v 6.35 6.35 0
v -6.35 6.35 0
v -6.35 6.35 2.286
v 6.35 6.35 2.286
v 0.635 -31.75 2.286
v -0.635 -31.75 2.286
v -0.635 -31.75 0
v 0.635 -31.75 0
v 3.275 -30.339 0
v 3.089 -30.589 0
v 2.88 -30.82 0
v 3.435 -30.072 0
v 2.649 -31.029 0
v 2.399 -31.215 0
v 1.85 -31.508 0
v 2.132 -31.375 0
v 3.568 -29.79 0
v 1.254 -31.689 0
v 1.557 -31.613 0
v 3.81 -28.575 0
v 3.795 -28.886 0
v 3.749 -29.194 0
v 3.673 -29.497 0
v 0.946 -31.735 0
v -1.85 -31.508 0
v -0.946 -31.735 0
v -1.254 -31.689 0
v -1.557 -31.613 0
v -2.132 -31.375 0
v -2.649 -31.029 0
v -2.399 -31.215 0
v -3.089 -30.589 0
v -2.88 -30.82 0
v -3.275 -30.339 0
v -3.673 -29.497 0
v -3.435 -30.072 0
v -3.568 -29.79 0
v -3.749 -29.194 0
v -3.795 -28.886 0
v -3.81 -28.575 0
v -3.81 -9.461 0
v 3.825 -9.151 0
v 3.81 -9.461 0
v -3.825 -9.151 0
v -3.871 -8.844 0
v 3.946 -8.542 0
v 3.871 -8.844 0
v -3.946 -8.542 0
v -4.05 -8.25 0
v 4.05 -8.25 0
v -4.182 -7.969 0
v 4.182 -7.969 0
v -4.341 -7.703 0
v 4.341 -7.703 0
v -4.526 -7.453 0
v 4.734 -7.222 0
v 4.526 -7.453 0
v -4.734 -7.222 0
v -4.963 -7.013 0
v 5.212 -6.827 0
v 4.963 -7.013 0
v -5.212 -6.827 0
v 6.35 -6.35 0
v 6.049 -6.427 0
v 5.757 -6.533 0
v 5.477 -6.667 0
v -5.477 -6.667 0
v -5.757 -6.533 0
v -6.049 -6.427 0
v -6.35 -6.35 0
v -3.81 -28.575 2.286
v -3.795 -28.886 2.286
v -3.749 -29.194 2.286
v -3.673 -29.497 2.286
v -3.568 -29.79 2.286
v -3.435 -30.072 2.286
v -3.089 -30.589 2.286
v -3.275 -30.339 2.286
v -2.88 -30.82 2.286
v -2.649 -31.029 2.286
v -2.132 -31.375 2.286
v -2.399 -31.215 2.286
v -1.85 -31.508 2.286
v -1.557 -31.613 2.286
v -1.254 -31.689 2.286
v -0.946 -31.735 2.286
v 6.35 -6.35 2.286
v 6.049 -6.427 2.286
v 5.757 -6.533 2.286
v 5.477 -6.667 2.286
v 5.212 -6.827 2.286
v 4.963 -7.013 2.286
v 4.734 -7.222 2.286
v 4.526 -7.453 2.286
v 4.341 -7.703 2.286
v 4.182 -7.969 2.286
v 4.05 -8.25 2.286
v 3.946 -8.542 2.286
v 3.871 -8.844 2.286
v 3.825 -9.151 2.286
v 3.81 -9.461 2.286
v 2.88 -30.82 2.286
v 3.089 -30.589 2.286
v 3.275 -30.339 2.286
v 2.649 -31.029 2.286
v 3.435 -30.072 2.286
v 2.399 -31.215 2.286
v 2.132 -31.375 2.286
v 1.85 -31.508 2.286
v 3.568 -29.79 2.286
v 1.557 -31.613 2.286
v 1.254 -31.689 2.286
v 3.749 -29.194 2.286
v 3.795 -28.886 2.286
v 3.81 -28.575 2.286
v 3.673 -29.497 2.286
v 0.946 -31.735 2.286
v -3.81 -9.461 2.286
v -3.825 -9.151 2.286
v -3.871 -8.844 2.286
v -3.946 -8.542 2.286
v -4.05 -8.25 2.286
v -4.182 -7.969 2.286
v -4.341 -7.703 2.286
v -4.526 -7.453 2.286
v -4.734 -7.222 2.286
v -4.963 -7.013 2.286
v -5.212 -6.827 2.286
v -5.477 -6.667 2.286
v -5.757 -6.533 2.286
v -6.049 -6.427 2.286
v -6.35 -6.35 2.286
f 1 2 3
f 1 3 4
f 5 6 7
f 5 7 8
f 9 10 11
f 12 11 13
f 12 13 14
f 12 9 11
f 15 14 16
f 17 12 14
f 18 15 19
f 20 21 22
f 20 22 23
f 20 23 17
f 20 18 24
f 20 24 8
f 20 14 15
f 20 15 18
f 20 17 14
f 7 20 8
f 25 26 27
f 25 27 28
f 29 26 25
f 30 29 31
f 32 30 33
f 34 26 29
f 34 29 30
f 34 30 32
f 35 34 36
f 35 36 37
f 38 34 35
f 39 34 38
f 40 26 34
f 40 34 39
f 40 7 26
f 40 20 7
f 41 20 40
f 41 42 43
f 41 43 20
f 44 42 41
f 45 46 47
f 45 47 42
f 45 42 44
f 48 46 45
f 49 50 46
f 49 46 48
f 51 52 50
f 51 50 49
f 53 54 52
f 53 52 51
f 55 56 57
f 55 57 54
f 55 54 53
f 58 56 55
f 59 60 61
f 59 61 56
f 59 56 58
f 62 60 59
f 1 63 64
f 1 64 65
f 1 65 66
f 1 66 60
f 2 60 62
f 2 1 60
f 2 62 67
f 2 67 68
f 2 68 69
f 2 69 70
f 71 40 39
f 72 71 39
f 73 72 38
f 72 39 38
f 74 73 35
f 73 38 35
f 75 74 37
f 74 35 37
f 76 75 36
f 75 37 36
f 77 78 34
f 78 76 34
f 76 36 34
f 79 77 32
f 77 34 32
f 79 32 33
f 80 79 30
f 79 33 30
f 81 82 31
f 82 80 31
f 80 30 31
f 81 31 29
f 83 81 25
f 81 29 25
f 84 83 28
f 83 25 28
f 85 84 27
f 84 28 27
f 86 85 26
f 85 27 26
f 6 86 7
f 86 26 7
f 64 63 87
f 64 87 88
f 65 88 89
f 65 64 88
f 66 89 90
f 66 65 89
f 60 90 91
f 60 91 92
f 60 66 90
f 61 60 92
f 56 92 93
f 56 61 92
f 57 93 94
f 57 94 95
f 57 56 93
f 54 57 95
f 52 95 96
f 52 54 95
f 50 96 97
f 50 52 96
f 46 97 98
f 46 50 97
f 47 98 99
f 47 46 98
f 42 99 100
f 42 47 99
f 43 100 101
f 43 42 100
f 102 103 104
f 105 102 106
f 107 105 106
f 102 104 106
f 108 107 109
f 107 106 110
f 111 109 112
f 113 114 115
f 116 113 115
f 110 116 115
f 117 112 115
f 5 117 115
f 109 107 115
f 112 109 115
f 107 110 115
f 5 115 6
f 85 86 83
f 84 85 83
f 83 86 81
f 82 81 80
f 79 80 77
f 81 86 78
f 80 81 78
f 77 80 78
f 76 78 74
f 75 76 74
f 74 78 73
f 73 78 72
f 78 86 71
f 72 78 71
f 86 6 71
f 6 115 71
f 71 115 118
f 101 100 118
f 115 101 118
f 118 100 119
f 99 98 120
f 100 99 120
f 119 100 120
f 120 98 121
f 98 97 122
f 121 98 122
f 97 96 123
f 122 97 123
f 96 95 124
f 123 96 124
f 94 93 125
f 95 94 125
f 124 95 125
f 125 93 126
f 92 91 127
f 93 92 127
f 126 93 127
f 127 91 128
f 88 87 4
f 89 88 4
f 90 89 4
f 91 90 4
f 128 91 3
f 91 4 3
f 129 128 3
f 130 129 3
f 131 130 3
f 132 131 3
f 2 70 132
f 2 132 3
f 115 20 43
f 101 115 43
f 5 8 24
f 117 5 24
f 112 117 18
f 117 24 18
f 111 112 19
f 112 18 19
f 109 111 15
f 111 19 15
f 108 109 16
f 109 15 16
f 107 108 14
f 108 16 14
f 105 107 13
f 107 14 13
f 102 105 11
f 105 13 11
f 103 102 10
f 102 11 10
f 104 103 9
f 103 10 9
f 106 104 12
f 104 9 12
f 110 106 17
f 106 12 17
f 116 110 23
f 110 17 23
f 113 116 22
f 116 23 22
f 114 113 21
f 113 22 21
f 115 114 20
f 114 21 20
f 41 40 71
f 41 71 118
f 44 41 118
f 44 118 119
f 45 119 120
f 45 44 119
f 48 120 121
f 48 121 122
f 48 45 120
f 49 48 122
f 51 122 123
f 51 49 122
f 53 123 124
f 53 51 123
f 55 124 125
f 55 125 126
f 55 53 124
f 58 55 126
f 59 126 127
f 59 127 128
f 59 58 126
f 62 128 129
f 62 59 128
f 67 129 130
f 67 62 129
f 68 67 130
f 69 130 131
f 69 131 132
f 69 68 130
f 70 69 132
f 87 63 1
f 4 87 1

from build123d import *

# Parameters (mm, degrees)
SKETCH1_W           = 7.62
SKETCH1_H           = 25.4
SKETCH1_W_2         = 12.7
SKETCH1_H_2         = 12.7
BOSS_EXTRUDE1_DEPTH = 2.286
FILLET1_R           = 3.175


with BuildPart() as part:
    # Sketch1 → Boss-Extrude1 (new body)
    with BuildSketch(Plane.XY):
        with Locations((0, -19.05)):
            Rectangle(SKETCH1_W, SKETCH1_H)
        Rectangle(SKETCH1_W_2, SKETCH1_H_2)
    extrude(amount=BOSS_EXTRUDE1_DEPTH)

    # Fillet1
    # the kernel refuses this fillet: 3.175 mm, written as the material it adds along each edge
    with BuildSketch(Plane(origin=(-3.81, -6.35, 0), x_dir=(-1.0, -1.5648025307703881e-12, 0), z_dir=(0, 0, 1))) as fillet1_piece_1:
        with BuildLine():
            CenterArc((3.175, 3.110851973), FILLET1_R, 180, 78.463040967)
            Line((0, 3.110851973), (0, 0))
            Line((0, 0), (2.54, 0))
        make_face()
    extrude(amount=2.286)
    with BuildSketch(Plane(origin=(3.81, -6.35, 0), x_dir=(1.0, -1.5644528542271996e-12, 0), z_dir=(0, 0, 1))) as fillet1_piece_2:
        with BuildLine():
            CenterArc((3.175, -3.110851973), FILLET1_R, 101.536959033, 78.463040967)
            Line((0, -3.110851973), (0, 0))
            Line((0, 0), (2.54, 0))
        make_face()
    extrude(amount=2.286)
    # the kernel refuses this fillet: 3.175 mm, written as the material it takes off along each edge
    with BuildSketch(Plane(origin=(-3.81, -31.75, -7.9375), x_dir=(1, 0, 0), z_dir=(0, 0, 1)), Plane(origin=(3.81, -31.75, -7.9375), x_dir=(0, 1, 0), z_dir=(0, 0, 1))) as fillet1_2_piece_1:
        with BuildLine():
            CenterArc((FILLET1_R, FILLET1_R), FILLET1_R, 180, 90)
            Line((0, FILLET1_R), (0, 0))
            Line((0, 0), (FILLET1_R, 0))
        make_face()
    extrude(amount=18.161, mode=Mode.SUBTRACT)


solid = part.part
